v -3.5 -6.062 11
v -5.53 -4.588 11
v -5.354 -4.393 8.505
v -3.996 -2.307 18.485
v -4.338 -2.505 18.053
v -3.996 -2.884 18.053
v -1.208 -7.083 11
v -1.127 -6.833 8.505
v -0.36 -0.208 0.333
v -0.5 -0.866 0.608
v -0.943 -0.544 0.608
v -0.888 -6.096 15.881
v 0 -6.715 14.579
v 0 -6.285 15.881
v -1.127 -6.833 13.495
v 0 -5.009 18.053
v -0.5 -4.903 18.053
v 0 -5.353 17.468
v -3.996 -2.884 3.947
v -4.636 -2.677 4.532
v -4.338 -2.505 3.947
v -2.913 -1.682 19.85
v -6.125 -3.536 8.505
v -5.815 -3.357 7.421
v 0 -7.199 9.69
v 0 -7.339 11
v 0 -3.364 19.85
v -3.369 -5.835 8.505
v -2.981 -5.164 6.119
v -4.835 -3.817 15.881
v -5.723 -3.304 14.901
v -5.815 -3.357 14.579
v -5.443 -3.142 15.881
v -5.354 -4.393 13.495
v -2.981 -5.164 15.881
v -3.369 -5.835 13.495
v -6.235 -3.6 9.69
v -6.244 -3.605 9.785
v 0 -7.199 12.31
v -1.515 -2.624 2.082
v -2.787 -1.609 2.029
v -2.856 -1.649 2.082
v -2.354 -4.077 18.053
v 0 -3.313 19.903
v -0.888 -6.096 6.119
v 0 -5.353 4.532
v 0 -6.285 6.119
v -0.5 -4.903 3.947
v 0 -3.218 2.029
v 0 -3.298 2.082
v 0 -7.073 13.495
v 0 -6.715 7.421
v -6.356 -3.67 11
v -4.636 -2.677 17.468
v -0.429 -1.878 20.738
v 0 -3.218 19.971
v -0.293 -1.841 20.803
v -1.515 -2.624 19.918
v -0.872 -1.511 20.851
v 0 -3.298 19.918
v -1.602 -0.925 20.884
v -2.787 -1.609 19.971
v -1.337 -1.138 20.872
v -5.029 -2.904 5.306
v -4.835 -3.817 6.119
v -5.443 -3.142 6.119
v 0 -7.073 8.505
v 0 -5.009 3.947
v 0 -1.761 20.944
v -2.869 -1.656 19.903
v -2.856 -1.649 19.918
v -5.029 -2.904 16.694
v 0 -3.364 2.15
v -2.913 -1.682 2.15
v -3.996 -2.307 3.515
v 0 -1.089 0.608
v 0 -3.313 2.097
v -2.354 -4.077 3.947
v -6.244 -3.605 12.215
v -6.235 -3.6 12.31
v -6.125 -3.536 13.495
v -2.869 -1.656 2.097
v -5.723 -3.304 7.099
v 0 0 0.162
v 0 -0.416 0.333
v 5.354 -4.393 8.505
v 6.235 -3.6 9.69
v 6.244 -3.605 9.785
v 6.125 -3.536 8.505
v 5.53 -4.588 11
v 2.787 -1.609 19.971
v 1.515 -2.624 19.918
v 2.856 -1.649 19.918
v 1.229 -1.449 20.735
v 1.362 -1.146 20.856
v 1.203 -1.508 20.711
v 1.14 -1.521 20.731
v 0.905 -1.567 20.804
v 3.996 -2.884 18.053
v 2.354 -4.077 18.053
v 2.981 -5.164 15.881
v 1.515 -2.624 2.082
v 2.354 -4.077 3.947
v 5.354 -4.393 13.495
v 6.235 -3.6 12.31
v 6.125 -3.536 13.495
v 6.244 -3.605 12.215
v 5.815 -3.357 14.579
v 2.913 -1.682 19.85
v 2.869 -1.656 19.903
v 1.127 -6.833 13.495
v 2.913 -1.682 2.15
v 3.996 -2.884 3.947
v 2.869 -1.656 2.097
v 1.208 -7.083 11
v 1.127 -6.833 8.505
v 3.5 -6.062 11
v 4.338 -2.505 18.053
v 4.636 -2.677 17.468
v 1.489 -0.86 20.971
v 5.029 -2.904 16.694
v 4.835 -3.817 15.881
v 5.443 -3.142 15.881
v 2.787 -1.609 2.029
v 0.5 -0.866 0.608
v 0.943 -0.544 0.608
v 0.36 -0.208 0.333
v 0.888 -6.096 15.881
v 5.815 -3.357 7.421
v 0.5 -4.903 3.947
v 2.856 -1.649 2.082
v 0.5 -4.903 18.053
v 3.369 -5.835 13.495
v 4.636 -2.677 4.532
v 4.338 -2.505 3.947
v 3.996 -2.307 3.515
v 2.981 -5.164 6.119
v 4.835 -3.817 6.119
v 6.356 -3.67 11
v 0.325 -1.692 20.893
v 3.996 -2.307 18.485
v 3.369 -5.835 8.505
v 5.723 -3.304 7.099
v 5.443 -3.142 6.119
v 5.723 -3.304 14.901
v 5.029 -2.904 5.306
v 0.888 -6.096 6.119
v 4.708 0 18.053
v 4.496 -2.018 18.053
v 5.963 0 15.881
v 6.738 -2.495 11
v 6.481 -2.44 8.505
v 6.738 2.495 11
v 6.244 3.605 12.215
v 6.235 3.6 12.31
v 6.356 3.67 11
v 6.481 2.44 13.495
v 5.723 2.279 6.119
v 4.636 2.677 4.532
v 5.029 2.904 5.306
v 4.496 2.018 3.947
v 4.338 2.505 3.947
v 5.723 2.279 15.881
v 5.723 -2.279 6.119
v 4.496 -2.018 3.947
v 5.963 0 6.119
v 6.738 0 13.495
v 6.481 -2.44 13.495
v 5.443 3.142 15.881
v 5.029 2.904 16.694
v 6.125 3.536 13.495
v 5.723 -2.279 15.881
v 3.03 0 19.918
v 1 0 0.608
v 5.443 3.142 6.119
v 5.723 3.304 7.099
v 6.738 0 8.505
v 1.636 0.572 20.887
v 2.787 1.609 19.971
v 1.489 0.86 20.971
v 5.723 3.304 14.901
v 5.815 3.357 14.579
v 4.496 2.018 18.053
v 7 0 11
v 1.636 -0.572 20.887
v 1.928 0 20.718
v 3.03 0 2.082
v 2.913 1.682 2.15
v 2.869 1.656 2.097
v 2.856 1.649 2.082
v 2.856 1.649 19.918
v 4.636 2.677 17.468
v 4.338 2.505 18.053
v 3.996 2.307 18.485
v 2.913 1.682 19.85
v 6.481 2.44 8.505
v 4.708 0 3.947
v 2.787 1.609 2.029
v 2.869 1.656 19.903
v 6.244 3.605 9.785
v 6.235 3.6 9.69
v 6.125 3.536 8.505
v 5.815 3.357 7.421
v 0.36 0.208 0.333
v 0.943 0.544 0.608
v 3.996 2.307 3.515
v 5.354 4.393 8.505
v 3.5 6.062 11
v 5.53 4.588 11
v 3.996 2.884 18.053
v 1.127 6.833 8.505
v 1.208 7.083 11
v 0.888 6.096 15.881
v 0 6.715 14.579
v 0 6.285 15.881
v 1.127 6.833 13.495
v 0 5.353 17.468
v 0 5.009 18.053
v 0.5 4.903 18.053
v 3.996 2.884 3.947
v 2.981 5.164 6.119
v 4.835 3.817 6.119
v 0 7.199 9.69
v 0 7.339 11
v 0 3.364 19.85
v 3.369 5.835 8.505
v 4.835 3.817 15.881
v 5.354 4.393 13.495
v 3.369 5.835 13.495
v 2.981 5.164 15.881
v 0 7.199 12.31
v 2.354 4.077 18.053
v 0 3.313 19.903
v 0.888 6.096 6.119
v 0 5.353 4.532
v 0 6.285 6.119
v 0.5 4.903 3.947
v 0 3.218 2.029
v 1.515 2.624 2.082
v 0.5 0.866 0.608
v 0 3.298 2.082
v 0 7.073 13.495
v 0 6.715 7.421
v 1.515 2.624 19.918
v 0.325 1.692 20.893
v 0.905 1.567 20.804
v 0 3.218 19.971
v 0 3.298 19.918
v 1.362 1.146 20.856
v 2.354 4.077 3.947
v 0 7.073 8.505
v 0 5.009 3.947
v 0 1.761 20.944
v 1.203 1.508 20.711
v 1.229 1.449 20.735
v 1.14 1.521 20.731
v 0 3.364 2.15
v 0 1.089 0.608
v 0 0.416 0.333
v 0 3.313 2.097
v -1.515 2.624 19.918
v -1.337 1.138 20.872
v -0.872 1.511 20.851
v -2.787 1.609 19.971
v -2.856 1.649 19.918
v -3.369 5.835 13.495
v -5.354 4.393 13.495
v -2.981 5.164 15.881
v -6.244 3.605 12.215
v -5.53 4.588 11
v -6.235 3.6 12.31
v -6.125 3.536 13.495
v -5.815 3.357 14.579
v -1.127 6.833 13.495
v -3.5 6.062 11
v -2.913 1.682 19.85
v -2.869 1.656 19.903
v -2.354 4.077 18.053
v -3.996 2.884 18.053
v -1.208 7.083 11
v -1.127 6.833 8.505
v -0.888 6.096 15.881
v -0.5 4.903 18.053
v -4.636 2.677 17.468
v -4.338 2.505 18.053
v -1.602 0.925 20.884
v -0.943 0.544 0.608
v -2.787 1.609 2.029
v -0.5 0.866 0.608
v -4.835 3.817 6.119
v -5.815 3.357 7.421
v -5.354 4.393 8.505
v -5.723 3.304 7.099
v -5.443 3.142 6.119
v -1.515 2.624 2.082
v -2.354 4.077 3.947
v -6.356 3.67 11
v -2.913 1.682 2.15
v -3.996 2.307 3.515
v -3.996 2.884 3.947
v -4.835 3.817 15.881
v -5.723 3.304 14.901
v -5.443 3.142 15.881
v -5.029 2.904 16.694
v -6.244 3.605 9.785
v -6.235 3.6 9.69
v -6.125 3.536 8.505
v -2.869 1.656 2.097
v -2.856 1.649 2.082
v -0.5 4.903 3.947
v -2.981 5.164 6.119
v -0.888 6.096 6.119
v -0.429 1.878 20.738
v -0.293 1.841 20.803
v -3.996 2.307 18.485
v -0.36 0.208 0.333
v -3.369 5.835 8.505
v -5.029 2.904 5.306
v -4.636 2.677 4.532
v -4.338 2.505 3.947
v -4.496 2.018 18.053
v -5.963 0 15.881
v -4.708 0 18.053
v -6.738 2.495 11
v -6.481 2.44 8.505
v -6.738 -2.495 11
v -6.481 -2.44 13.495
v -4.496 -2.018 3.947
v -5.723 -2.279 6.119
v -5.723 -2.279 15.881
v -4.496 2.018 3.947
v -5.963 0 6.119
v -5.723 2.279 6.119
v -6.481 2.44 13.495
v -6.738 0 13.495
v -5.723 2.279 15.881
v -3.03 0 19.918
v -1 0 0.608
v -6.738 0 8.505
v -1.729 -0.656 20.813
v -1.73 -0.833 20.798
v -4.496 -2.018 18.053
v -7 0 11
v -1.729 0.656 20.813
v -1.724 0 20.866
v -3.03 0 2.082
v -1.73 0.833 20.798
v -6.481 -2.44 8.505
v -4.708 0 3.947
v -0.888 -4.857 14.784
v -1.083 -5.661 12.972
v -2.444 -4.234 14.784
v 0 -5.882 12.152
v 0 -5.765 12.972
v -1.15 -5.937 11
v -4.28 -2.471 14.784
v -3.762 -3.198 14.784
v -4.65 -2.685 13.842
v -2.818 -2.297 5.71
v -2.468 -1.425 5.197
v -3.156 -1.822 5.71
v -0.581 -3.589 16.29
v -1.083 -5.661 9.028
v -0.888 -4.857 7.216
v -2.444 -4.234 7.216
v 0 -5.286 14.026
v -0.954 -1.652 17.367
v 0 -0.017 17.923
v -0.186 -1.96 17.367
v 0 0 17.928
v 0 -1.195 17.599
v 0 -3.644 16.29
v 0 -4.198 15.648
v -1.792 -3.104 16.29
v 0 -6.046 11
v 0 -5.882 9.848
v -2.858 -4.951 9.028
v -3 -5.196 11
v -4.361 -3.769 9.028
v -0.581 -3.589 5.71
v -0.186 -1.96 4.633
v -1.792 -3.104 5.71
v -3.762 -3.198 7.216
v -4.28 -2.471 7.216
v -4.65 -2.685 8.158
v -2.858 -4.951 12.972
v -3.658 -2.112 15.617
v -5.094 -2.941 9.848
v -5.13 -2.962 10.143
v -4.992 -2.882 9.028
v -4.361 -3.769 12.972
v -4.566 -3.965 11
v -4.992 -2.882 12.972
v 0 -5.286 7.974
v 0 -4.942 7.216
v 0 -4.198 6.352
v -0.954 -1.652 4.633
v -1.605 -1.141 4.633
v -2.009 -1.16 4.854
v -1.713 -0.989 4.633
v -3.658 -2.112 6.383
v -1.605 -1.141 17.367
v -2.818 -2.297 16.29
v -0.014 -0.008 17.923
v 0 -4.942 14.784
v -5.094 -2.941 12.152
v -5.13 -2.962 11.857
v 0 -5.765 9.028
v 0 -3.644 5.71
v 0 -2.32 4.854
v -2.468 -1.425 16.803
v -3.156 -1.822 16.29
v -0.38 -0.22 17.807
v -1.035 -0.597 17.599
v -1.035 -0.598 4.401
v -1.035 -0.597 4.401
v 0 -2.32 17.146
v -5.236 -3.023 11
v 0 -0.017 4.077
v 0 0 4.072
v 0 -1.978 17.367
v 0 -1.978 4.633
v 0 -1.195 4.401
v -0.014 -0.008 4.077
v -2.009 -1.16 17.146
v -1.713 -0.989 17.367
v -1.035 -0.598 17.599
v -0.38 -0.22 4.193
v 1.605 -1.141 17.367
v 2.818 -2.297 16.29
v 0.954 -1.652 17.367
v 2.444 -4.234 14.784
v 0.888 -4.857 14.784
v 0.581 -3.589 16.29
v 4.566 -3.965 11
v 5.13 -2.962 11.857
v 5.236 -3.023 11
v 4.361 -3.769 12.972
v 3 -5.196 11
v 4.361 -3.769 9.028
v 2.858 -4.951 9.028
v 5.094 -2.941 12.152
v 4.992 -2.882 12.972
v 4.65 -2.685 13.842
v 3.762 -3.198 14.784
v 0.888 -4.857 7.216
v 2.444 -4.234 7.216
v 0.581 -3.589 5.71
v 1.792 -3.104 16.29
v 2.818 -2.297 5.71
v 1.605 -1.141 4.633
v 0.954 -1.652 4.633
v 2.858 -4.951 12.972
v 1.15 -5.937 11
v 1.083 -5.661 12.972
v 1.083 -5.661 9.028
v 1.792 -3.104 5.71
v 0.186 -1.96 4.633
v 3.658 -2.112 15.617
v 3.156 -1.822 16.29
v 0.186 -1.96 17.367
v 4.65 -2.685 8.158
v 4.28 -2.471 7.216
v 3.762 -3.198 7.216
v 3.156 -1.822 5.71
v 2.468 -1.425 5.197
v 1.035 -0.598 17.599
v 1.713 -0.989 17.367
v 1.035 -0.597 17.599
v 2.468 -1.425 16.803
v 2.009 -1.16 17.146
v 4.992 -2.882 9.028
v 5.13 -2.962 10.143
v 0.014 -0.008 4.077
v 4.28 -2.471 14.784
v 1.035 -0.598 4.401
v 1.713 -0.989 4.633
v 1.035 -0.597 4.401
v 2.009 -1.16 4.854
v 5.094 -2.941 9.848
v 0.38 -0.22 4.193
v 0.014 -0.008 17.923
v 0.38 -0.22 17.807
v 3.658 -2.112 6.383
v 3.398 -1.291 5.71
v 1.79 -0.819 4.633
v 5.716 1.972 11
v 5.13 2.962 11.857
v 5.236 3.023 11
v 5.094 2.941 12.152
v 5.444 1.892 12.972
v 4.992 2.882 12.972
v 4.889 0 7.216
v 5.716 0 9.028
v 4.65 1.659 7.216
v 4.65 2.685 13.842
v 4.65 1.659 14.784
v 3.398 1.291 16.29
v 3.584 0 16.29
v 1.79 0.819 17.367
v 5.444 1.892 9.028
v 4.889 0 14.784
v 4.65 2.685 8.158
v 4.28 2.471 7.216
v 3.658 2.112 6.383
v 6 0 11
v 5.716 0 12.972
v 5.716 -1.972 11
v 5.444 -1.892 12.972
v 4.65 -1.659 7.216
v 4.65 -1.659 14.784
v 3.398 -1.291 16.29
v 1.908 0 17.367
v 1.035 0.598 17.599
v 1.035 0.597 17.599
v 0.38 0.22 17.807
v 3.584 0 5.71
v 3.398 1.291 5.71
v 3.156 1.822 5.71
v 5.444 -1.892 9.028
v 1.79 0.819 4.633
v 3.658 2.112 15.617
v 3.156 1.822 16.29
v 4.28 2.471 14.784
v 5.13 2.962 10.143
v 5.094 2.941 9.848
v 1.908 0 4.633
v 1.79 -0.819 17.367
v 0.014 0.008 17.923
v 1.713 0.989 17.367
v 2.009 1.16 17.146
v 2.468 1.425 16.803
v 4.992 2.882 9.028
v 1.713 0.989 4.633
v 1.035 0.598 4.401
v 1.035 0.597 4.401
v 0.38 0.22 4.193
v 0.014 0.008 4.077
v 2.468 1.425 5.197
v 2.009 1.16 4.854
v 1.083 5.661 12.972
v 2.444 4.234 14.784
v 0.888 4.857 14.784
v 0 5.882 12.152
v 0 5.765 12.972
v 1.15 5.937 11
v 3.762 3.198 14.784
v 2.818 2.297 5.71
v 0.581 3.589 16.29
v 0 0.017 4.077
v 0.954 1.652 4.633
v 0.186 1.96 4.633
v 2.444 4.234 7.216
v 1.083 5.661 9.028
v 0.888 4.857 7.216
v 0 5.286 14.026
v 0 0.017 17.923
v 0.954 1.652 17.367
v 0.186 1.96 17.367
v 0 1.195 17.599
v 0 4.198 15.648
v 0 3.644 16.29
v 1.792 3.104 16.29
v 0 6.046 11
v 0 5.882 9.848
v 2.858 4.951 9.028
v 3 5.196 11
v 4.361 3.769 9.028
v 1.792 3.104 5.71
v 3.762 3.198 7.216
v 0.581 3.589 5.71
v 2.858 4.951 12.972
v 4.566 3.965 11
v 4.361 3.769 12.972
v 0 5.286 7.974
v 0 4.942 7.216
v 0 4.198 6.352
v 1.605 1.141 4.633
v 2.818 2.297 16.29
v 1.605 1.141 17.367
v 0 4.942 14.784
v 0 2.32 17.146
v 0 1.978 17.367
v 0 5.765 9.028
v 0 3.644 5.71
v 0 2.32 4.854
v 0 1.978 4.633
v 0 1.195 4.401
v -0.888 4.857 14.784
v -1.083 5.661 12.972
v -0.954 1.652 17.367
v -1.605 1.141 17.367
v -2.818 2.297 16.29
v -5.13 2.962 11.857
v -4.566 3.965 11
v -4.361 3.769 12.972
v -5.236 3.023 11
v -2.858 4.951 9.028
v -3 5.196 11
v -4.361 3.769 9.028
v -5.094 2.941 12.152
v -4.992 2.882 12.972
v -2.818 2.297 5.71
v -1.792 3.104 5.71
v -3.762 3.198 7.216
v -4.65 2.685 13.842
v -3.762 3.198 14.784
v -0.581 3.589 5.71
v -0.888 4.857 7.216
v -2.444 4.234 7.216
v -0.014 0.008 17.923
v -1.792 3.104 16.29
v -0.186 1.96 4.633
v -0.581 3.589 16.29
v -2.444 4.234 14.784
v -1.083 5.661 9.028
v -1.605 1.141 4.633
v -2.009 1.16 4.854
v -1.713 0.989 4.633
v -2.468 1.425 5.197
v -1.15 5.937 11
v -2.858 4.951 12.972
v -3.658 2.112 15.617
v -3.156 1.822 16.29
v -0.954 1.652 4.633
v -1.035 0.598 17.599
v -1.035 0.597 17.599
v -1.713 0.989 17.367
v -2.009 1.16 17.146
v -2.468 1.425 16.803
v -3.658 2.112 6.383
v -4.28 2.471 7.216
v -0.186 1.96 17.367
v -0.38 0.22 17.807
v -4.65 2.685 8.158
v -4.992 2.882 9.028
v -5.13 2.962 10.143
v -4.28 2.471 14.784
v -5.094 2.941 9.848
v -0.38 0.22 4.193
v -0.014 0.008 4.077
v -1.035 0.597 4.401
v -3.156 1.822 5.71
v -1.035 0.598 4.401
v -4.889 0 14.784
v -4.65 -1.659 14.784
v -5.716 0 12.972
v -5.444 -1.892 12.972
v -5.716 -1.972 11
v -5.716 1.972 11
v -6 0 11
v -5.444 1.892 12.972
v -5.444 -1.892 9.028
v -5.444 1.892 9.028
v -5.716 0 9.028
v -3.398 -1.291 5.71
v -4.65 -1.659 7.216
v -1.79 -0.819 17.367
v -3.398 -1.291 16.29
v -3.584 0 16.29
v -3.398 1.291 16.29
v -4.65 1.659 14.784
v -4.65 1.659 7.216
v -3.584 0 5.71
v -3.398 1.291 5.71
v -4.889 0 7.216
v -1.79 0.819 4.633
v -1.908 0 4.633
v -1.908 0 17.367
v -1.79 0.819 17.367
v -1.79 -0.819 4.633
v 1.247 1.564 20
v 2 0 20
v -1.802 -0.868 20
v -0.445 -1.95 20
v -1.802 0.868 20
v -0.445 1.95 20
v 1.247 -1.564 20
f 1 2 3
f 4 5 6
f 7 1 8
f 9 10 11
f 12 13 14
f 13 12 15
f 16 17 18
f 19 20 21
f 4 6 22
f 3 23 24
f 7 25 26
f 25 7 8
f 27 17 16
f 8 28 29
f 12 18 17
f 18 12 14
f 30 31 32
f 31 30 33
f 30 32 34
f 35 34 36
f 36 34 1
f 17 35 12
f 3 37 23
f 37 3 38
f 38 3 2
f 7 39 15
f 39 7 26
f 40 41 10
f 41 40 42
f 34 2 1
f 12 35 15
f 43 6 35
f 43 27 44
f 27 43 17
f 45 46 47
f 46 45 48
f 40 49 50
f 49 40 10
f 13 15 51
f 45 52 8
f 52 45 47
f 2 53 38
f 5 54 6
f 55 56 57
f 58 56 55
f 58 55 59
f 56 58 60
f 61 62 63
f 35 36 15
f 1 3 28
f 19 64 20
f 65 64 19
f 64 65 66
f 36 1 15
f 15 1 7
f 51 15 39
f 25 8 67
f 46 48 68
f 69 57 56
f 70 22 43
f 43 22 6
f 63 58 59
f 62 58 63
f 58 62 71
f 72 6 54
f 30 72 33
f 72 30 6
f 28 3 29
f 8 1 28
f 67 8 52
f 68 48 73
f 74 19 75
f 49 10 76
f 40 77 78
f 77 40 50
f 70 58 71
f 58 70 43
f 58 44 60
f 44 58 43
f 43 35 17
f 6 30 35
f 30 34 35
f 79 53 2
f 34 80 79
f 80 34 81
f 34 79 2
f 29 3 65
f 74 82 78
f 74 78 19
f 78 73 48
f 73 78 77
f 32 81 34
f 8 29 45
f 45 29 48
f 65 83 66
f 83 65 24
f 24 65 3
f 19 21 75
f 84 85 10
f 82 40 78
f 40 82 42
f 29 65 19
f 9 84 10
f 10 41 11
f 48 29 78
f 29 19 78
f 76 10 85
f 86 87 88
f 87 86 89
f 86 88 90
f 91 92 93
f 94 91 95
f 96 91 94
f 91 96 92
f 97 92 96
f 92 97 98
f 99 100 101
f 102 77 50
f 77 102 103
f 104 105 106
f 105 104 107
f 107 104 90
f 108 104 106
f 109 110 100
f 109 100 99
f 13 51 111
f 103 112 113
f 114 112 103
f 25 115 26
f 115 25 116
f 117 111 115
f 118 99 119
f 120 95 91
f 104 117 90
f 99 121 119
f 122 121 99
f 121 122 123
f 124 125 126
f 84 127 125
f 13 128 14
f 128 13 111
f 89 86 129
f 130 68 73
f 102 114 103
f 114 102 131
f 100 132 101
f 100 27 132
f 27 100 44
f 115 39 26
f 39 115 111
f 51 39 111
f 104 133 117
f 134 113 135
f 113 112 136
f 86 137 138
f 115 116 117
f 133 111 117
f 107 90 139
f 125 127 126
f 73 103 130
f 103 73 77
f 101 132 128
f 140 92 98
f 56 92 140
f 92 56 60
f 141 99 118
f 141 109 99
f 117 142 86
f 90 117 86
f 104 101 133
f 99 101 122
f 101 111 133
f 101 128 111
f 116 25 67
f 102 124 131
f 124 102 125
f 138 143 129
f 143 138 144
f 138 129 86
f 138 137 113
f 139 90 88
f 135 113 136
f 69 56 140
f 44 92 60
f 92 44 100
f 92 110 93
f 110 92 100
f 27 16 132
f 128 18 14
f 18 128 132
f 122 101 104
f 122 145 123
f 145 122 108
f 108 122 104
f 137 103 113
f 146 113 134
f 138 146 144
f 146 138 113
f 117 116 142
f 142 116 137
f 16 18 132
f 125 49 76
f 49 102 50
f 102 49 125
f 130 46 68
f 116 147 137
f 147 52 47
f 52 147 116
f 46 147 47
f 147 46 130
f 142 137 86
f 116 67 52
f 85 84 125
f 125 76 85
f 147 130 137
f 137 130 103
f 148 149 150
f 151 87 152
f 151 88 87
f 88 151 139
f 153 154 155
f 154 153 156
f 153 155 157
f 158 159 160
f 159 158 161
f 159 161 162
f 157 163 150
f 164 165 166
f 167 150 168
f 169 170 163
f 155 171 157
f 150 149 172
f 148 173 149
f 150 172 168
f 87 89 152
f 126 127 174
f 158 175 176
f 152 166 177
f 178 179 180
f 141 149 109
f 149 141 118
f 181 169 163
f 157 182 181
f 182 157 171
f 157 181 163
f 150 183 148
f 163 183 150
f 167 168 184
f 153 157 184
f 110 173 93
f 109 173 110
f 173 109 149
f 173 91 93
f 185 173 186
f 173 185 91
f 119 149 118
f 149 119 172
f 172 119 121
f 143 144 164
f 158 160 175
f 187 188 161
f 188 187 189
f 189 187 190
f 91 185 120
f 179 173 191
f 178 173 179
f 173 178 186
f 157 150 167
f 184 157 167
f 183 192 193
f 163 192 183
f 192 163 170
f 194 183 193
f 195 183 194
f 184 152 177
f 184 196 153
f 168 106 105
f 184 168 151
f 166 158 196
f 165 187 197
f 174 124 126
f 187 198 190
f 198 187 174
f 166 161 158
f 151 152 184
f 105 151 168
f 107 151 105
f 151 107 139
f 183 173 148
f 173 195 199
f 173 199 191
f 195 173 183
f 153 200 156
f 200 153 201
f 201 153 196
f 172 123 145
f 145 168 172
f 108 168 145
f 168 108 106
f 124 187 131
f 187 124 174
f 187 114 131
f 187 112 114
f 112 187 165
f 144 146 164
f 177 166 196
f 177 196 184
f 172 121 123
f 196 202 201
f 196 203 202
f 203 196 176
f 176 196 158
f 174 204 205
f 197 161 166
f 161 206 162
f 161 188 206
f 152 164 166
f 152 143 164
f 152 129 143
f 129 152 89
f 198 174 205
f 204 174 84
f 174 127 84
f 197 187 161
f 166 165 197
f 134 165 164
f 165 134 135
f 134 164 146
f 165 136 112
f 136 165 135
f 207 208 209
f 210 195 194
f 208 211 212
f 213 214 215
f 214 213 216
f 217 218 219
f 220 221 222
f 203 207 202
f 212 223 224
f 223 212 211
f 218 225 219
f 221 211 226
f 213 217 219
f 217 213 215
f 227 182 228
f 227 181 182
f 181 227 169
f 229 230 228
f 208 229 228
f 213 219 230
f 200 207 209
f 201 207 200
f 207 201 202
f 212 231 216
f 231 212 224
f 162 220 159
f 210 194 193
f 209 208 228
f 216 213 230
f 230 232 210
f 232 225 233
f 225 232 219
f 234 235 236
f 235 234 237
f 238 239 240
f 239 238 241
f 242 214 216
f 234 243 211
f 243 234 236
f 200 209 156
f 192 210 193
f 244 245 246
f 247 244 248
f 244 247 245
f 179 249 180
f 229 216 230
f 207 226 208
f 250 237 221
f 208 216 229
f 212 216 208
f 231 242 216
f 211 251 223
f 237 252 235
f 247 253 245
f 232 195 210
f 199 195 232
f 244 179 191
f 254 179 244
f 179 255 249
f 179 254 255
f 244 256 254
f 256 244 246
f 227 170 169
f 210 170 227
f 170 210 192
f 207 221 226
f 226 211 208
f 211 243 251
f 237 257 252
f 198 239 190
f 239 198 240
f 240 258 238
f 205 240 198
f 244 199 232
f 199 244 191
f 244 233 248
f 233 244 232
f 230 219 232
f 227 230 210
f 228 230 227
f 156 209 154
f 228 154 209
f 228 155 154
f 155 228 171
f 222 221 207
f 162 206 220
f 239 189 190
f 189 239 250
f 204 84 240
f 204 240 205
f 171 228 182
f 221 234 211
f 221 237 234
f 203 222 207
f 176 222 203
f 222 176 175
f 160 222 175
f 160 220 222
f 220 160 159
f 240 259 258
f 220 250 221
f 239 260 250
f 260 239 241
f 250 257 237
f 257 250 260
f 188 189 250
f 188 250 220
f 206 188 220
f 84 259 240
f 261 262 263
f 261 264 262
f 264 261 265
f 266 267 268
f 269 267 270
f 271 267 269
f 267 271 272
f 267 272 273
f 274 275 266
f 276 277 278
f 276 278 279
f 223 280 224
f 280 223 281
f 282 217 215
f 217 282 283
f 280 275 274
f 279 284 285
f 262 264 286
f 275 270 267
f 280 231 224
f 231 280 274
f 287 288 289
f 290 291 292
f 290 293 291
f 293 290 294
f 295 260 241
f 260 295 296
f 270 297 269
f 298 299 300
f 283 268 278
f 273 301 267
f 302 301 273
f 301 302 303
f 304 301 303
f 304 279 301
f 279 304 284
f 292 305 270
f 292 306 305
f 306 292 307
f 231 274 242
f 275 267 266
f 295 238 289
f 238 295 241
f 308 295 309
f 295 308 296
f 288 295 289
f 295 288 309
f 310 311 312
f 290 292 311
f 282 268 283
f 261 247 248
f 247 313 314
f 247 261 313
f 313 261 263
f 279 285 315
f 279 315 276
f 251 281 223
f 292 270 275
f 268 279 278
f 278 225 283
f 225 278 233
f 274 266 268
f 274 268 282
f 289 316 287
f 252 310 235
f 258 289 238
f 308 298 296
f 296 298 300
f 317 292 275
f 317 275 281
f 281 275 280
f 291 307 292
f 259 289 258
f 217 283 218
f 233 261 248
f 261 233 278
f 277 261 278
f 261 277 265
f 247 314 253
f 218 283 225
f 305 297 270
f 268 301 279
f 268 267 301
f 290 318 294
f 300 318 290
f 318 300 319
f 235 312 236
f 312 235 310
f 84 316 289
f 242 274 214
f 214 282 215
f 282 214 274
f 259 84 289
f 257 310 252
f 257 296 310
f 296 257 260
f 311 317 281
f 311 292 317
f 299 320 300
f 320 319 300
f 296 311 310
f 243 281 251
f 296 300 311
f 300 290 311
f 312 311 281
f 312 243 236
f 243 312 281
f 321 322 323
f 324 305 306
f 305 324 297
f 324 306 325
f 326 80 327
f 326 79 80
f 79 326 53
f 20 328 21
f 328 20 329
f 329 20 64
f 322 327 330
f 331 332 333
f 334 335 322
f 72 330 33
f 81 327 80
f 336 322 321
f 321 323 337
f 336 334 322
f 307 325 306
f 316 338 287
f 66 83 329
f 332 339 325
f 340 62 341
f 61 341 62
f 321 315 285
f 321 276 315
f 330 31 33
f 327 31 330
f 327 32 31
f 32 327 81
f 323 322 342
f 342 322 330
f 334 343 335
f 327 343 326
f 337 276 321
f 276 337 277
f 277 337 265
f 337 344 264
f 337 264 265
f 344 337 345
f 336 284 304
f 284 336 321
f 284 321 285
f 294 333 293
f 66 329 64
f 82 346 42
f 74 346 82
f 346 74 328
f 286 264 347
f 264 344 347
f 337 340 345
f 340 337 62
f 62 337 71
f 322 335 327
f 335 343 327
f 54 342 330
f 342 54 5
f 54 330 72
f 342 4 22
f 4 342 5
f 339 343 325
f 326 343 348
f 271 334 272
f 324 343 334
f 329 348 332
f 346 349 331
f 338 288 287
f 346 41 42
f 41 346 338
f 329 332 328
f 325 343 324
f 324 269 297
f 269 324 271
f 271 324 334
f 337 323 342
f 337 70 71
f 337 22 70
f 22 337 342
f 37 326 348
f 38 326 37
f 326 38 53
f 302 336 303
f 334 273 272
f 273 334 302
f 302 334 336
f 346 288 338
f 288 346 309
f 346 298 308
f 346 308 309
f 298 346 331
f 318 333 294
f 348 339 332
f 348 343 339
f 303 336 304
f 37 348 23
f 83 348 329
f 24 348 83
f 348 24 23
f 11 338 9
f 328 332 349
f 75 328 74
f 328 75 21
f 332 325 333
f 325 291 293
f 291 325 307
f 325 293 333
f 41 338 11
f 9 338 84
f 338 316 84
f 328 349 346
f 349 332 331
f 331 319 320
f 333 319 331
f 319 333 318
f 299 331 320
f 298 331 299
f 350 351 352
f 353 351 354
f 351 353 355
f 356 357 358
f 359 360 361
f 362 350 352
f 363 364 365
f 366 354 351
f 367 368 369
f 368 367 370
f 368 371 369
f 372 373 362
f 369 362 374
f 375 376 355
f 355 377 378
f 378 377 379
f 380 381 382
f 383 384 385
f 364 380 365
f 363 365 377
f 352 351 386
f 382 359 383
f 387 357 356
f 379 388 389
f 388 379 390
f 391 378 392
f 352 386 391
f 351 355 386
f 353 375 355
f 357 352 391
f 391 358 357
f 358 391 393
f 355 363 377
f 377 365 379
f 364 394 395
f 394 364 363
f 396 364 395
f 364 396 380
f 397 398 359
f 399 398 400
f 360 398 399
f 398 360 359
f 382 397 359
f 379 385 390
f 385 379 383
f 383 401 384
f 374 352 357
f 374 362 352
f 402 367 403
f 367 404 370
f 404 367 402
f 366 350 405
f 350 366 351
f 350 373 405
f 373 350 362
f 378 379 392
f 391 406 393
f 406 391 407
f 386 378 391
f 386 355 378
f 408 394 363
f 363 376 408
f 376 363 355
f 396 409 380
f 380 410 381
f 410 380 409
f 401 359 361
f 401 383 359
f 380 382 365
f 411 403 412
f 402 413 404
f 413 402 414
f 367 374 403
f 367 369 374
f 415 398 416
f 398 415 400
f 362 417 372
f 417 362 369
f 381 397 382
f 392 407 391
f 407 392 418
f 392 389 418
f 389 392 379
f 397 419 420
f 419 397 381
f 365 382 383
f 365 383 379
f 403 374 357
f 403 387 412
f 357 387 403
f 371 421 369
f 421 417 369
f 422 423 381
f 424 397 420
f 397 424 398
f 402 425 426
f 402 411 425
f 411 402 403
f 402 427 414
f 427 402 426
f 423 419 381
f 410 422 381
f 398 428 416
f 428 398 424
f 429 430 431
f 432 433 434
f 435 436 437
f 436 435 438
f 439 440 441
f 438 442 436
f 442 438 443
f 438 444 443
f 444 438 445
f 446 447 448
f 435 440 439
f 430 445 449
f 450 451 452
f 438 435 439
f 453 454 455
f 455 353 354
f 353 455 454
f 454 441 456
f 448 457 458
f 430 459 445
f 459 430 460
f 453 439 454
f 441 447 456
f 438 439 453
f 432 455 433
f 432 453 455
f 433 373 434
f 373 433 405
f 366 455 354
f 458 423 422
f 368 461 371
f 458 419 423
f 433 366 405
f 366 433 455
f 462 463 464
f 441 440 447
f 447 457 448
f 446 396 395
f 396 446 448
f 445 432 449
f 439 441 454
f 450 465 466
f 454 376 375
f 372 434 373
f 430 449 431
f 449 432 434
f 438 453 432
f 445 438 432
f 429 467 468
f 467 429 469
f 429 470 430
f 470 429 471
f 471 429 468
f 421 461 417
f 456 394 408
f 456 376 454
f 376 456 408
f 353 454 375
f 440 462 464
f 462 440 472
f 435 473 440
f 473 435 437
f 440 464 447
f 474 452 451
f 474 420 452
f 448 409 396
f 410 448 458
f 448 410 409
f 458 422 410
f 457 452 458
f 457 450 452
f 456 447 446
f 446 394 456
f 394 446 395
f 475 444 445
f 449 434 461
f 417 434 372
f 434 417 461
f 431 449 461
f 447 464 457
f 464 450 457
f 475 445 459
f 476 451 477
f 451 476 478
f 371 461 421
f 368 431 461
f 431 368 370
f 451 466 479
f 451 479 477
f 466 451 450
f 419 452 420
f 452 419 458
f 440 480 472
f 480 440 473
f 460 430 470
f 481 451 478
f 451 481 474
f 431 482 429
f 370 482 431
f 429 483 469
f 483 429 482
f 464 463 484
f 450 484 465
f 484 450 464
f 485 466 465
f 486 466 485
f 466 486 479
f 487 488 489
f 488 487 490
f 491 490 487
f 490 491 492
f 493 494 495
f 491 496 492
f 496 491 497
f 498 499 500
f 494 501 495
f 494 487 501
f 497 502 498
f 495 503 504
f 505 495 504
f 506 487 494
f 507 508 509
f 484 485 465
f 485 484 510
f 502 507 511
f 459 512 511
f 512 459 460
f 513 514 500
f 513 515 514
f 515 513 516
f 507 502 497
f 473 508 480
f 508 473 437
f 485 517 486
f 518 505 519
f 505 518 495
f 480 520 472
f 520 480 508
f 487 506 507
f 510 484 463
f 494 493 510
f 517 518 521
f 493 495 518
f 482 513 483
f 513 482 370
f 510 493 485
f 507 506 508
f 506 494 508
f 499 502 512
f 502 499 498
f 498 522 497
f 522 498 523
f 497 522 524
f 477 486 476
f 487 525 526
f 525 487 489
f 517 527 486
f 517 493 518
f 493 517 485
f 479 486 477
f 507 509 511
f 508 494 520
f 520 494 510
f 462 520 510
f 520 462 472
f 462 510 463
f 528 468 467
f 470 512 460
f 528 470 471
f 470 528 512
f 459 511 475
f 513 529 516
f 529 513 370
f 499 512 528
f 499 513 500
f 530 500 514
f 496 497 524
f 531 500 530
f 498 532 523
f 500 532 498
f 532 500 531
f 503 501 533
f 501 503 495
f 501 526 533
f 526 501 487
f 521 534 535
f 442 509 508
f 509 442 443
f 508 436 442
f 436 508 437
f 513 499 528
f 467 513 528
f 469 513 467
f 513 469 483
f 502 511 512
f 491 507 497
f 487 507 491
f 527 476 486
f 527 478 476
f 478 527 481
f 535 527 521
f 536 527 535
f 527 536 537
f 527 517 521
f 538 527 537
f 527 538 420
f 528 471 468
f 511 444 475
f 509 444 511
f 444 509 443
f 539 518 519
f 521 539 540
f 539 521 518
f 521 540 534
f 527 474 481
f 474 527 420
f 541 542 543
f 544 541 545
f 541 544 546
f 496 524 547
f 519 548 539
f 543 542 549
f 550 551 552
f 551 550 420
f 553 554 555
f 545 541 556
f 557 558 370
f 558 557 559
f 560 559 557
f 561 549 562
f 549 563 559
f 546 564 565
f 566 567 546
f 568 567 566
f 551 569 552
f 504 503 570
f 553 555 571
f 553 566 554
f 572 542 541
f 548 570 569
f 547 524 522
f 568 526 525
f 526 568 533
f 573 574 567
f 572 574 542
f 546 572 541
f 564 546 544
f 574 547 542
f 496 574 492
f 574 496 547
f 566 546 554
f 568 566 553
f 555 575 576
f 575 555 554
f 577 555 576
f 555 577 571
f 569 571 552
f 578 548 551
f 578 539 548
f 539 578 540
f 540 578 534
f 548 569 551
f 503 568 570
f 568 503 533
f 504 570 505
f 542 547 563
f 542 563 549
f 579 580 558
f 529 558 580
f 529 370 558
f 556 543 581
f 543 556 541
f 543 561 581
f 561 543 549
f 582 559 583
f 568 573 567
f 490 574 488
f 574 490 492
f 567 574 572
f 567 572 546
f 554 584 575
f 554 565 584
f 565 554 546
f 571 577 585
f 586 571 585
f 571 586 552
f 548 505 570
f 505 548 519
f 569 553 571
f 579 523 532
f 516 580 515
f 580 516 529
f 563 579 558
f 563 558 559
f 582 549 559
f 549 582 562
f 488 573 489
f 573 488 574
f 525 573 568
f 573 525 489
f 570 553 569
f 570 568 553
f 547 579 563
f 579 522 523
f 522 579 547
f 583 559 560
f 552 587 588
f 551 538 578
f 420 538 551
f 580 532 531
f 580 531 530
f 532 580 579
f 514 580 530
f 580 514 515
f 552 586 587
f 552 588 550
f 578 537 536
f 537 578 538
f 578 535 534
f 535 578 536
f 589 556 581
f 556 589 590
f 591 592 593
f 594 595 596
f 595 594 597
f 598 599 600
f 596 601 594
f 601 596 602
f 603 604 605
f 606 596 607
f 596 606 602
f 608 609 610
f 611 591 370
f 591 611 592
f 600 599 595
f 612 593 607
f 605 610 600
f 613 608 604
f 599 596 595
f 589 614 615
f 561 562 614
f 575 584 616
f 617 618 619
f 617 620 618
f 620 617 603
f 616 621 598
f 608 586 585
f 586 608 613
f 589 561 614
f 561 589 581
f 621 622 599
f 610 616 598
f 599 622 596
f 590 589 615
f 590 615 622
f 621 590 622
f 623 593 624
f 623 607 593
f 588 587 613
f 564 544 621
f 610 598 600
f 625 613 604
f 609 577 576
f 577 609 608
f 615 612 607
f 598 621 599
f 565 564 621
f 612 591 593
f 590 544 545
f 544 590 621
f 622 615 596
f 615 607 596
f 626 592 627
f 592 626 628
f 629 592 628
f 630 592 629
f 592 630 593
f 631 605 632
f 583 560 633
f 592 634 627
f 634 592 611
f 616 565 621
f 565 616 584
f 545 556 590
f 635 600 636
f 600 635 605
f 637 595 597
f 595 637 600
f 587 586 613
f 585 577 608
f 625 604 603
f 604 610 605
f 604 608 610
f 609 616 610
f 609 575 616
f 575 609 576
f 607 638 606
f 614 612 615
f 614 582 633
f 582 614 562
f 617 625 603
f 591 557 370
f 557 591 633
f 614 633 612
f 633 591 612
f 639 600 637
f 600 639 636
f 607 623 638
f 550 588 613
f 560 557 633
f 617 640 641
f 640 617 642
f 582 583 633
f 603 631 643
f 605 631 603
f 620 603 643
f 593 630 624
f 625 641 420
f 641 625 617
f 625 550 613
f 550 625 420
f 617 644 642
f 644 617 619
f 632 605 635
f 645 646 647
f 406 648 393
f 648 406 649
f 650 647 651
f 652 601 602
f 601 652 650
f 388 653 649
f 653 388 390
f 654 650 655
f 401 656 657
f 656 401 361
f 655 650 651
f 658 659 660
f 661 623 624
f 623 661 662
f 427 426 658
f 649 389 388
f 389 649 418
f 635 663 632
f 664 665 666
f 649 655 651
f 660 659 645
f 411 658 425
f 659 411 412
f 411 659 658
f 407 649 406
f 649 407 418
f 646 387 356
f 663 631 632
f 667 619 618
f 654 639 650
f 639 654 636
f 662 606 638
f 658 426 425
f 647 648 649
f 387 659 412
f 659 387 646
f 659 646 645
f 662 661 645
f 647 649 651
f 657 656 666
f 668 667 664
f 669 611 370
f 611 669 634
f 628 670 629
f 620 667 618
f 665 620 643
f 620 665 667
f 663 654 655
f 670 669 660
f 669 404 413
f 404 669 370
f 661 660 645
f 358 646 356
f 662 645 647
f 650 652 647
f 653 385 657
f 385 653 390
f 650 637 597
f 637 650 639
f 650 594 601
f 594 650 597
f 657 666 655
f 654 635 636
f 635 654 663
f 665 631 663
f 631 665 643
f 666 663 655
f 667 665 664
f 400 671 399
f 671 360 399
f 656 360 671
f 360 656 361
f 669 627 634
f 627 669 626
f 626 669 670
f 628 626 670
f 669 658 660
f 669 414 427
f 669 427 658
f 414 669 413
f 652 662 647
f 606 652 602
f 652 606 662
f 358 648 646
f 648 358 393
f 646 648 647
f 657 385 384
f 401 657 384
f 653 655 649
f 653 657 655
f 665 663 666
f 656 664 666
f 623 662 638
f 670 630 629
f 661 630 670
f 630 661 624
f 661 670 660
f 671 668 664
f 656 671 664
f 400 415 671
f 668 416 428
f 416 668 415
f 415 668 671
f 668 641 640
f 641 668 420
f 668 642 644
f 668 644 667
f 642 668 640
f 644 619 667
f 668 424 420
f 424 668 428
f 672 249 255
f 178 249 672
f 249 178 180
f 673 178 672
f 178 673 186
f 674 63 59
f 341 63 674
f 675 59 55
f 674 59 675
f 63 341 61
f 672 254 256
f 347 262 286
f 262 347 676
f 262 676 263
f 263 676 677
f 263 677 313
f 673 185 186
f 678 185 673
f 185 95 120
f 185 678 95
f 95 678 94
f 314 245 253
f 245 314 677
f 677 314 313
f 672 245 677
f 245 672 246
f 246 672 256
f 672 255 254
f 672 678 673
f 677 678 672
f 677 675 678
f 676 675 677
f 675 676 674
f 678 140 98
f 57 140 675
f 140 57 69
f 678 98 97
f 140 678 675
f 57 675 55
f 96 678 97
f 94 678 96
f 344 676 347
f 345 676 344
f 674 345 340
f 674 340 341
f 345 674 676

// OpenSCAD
difference()
{
	translate([0,0,11])
	{
		difference()
		{
			intersection_for(n = [1 : 6])
			{
	    			rotate([0, 0, n * 60])
	    			{
	        			translate([5,0,0])
	        			sphere(r=12);
	    			}
			}
	
			intersection_for(n = [1 : 6])
			{
	    			rotate([0, 0, n * 60])
	    			{
	        			translate([1,0,0])
	        			sphere(r=7);
	    			}
			}
		}
	}

translate([0,0,20])
cylinder(10,2);

}
